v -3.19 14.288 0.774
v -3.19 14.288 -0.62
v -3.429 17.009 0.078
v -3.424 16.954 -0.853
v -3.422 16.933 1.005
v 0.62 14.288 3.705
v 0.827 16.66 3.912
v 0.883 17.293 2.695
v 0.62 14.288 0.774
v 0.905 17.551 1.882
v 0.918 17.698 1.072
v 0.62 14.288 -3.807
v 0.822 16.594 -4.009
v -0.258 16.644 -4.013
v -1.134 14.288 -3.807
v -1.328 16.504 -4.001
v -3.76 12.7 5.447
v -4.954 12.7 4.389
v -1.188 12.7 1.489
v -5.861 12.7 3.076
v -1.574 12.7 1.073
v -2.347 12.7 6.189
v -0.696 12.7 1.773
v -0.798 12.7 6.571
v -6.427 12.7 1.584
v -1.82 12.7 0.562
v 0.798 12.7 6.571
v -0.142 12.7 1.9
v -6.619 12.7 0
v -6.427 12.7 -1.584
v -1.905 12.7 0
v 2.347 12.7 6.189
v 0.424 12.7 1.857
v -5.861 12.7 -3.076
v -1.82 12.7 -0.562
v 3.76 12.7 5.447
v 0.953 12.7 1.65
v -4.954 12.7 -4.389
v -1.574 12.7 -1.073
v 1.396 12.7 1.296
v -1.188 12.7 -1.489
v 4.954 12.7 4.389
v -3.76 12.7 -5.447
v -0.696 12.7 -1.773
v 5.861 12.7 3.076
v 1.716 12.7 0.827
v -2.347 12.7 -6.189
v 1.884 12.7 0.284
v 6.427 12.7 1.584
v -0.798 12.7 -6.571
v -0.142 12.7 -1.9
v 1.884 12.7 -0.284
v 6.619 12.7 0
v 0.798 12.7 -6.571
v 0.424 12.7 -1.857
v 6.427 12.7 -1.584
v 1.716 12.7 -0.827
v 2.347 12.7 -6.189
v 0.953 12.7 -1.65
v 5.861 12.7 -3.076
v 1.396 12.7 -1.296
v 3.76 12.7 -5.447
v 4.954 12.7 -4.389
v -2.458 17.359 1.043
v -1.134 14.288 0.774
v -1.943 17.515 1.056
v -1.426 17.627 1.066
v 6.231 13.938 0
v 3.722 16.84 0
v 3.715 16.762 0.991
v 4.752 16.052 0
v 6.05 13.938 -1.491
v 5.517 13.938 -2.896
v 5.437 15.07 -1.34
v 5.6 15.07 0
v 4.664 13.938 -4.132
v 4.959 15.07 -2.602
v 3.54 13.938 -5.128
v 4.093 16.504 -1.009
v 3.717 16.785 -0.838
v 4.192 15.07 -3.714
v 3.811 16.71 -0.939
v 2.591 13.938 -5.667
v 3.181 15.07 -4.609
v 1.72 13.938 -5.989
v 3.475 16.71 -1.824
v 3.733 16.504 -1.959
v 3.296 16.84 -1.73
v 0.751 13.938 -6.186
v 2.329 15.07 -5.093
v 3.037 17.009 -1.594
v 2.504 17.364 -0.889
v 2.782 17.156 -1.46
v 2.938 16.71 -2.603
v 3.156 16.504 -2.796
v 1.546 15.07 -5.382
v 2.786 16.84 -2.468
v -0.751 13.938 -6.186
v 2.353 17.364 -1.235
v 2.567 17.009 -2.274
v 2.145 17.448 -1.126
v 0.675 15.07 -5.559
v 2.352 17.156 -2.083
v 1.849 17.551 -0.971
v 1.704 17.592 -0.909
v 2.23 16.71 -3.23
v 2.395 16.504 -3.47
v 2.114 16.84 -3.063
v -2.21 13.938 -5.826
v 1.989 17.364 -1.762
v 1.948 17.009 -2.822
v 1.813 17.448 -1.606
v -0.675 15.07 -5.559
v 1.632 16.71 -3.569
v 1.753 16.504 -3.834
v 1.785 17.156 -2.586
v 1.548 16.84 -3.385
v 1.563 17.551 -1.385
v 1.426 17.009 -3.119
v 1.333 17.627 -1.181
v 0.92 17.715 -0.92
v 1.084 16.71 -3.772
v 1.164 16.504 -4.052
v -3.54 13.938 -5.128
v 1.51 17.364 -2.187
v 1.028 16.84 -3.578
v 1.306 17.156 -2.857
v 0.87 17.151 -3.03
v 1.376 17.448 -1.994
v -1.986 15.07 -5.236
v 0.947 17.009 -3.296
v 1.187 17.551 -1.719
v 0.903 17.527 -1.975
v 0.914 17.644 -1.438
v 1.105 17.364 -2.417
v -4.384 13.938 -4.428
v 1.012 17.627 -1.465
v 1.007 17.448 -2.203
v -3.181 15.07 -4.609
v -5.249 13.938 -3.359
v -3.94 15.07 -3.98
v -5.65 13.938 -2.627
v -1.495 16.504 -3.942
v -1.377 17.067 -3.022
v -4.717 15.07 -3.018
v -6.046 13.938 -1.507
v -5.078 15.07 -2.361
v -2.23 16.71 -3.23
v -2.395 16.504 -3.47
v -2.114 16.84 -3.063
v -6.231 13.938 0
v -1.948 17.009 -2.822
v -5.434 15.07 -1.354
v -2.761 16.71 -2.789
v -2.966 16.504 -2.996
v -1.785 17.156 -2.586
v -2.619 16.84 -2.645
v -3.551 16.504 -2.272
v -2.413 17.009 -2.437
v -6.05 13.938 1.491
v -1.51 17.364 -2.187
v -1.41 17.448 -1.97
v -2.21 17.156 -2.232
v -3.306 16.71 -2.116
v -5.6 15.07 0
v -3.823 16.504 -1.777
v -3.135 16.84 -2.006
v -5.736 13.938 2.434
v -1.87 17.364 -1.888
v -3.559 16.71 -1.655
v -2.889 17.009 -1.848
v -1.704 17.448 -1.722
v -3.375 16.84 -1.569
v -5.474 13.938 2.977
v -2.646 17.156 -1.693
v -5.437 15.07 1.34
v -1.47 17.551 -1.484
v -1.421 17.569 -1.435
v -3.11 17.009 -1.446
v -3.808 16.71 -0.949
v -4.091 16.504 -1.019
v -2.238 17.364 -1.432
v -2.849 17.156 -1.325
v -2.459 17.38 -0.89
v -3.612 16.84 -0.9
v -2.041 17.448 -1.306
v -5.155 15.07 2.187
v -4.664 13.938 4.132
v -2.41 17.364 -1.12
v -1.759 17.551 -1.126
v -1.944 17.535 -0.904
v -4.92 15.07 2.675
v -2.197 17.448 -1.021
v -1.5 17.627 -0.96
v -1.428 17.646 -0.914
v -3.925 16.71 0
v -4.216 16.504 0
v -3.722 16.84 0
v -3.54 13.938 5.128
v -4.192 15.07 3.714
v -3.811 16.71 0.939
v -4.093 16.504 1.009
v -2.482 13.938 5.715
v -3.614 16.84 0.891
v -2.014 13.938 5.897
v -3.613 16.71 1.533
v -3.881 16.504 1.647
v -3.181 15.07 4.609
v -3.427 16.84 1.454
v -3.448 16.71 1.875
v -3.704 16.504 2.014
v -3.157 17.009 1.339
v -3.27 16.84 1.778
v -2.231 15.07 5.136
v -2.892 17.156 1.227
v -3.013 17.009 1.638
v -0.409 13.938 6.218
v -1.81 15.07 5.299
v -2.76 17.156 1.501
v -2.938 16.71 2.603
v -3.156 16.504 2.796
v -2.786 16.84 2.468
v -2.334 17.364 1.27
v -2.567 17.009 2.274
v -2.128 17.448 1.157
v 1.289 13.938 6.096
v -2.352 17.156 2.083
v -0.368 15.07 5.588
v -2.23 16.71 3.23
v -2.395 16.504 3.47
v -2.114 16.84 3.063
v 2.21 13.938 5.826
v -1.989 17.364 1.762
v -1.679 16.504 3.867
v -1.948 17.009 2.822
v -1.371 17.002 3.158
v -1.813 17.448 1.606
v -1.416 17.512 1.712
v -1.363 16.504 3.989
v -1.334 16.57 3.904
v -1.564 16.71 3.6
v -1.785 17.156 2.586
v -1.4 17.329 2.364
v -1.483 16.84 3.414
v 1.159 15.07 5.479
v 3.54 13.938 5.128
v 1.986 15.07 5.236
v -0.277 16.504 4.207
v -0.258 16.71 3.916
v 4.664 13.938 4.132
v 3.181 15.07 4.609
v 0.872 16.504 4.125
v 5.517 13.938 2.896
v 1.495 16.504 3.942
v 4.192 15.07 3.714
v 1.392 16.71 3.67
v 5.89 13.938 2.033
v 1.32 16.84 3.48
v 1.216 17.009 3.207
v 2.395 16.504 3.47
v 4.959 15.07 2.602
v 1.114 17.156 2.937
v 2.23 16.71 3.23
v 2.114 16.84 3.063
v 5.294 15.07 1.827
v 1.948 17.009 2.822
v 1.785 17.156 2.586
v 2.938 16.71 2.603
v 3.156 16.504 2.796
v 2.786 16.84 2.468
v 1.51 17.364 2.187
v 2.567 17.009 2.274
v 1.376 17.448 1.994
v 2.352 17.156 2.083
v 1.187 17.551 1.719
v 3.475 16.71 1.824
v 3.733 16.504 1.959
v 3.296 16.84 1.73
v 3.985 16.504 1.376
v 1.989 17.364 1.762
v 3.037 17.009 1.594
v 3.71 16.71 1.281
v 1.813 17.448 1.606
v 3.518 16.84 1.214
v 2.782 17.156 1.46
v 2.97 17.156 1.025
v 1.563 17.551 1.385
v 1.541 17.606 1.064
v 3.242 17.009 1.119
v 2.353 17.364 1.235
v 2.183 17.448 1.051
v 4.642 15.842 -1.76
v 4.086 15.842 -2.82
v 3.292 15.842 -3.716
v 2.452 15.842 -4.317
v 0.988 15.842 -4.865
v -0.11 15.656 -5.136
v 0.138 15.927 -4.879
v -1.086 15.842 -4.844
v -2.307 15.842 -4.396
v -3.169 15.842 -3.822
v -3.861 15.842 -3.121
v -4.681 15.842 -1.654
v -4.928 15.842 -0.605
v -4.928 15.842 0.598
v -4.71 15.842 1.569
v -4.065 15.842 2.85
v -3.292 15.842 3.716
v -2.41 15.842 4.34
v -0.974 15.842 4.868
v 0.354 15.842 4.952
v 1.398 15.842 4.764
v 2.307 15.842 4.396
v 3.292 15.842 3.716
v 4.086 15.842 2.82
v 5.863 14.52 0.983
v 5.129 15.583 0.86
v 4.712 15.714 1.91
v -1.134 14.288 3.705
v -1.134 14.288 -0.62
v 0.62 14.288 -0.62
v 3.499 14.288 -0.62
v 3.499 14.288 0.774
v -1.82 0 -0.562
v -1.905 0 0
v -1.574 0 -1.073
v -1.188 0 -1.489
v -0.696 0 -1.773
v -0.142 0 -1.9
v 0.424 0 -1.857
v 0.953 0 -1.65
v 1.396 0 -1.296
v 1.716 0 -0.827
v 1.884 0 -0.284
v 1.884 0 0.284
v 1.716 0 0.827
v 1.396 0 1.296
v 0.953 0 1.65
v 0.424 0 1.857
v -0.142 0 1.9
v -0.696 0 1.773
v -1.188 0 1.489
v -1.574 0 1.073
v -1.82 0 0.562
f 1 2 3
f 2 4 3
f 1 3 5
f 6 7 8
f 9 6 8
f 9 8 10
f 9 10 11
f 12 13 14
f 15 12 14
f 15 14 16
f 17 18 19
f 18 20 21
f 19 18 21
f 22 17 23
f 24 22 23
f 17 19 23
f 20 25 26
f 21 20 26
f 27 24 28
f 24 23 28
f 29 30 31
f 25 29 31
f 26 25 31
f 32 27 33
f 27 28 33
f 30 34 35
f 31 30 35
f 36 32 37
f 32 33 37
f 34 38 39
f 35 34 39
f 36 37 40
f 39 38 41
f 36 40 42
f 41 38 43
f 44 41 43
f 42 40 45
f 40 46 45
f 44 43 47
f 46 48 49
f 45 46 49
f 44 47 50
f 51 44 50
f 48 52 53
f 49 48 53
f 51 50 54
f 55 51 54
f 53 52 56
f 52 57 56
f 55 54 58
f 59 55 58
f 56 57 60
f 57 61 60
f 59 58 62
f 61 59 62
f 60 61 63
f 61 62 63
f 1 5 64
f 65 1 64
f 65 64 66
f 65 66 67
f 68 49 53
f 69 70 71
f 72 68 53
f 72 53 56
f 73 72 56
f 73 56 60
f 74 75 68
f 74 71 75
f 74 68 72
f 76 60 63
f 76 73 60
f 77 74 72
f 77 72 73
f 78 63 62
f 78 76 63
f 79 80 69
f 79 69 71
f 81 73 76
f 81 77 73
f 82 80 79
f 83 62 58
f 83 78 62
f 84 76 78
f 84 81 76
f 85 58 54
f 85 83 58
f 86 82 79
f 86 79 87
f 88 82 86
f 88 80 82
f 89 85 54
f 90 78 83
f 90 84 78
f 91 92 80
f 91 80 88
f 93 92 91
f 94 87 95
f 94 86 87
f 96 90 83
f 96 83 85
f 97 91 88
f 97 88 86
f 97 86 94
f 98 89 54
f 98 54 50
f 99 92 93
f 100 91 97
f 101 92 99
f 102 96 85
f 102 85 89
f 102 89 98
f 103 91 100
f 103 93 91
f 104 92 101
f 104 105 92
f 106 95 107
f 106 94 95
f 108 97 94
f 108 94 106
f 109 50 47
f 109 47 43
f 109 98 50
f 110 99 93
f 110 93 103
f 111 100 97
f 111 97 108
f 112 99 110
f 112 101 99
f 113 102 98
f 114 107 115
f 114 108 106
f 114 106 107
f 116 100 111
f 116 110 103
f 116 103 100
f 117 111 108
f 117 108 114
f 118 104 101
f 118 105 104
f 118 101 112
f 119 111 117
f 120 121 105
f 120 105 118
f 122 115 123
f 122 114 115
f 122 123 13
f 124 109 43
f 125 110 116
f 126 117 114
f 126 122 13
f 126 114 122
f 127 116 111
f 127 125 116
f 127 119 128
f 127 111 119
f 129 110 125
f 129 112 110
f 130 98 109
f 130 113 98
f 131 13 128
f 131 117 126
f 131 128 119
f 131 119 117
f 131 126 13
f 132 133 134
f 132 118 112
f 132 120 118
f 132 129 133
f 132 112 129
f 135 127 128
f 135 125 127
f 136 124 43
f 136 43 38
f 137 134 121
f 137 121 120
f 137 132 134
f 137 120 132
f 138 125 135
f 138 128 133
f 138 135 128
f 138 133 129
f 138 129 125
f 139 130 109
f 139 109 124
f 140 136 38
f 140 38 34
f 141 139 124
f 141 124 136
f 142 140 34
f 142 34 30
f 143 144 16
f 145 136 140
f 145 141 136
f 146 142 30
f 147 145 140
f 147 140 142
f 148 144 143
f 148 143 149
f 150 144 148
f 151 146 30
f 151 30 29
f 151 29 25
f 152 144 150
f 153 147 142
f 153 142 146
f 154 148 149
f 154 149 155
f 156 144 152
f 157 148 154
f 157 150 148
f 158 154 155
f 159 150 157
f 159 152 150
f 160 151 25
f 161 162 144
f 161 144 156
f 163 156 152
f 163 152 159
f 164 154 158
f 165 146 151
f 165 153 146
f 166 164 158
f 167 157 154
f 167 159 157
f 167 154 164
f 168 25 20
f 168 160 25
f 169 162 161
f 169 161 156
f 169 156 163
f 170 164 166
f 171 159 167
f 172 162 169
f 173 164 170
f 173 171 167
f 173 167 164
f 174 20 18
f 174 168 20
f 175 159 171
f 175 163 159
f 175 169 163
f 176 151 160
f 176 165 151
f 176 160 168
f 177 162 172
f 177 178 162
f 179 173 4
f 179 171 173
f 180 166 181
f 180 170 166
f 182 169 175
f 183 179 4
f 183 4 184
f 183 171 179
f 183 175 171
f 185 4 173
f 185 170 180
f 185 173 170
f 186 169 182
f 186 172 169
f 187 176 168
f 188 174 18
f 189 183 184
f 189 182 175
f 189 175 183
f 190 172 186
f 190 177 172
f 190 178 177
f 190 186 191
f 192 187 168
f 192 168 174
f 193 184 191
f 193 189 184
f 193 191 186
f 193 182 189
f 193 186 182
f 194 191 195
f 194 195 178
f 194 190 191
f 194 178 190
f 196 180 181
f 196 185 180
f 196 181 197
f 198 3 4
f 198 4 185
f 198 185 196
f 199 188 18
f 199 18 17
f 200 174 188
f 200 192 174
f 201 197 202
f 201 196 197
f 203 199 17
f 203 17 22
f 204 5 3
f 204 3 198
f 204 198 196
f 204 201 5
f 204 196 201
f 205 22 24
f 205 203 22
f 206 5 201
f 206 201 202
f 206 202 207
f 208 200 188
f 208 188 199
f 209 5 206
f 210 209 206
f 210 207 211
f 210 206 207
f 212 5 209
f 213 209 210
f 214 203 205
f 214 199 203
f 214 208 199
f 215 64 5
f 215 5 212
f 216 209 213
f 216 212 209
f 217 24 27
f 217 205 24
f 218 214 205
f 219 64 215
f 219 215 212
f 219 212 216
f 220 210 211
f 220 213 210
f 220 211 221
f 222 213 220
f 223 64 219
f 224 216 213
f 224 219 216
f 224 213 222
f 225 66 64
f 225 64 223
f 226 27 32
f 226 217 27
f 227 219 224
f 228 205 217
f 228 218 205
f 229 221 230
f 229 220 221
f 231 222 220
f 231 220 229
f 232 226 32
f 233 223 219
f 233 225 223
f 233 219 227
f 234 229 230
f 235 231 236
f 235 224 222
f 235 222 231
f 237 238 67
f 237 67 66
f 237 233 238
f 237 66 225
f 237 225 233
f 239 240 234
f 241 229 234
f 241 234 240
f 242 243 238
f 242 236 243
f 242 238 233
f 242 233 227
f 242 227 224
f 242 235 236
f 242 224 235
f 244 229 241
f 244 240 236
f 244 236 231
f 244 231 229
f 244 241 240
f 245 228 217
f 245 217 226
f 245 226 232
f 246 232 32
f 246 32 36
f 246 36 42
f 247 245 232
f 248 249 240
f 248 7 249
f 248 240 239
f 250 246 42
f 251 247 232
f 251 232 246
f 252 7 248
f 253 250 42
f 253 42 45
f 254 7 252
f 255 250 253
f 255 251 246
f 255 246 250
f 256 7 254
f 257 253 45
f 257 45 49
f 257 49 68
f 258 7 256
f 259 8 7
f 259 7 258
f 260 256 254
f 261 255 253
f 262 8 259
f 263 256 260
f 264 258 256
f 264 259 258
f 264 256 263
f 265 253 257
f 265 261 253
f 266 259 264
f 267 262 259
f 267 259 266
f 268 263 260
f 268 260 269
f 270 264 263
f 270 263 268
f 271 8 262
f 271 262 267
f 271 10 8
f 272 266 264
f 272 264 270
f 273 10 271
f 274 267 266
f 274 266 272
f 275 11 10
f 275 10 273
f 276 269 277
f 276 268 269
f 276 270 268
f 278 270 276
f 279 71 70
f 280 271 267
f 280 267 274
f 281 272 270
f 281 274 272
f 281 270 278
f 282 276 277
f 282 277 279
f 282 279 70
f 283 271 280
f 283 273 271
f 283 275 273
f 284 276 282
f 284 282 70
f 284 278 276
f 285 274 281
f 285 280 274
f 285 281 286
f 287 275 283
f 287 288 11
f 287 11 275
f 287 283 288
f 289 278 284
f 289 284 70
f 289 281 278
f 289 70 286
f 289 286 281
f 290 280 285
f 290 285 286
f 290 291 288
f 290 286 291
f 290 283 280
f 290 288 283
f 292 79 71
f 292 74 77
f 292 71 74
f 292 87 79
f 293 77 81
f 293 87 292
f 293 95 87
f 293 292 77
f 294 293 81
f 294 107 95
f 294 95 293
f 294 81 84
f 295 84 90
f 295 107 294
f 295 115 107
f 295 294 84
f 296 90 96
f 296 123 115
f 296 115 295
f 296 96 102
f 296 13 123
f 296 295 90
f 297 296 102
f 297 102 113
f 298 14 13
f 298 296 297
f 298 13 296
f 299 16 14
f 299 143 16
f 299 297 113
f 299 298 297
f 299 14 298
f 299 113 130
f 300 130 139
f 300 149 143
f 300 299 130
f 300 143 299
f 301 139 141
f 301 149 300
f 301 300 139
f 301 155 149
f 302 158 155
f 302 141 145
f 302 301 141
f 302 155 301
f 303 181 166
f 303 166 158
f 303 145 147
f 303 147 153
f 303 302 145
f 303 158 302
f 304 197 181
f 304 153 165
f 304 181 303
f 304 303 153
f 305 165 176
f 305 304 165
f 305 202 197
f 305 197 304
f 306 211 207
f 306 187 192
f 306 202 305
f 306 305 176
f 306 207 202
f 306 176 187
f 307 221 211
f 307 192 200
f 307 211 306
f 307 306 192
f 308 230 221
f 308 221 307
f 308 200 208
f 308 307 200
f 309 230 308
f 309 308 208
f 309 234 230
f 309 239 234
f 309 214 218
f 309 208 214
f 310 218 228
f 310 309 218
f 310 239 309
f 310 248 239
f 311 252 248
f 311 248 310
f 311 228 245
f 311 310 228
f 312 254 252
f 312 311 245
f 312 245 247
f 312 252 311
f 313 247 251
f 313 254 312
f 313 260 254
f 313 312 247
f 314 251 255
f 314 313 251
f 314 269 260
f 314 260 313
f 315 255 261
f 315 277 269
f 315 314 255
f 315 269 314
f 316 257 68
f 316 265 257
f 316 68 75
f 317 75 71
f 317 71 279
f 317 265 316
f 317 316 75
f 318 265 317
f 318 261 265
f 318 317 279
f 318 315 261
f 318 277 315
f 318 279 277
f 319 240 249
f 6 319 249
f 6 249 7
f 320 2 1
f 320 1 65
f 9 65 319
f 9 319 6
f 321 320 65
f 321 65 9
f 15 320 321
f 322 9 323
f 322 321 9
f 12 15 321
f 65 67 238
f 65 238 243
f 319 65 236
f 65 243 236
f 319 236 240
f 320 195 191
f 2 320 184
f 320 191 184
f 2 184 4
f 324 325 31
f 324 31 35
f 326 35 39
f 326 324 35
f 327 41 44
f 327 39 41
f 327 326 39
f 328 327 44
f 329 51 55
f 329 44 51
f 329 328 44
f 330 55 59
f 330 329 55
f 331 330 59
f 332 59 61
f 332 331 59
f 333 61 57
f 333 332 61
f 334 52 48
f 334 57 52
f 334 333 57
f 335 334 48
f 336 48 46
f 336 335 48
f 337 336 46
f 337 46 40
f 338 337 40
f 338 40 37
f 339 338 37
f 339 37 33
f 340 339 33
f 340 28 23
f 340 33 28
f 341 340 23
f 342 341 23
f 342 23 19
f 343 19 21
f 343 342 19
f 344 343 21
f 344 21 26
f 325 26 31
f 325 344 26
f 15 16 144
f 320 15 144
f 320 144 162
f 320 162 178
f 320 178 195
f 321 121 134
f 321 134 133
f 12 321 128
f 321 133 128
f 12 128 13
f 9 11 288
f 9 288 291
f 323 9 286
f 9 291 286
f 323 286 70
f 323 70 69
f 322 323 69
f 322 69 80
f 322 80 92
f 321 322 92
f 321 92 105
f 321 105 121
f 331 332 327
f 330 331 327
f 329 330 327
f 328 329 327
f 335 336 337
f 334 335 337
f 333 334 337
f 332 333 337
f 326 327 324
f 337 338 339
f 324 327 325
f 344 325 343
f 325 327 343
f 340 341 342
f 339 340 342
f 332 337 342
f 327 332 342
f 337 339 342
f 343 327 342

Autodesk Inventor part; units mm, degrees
ref_plane "YZ Plane" through (0, 0, 0) normal (1, 0, 0) x (0, 1, 0)
ref_plane "XZ Plane" through (0, 0, 0) normal (0, 1, 0) x (-1, 0, 0)
ref_plane "XY Plane" through (0, 0, 0) normal (0, 0, 1) x (1, 0, 0)
sketch "Sketch1" plane through (0, 0, 0) normal (0, 1, 0) x (-1, 0, 0)
  circle A0 centre (0, 0) radius 1.905
  dimension "d0" = 3.81
extrude "Extrusion1" add sketch "Sketch1" along normal blind 12.7
thread "Thread1" size "8-32 UNC" class "2A" standard "ANSI Unified Screw Threads" full length
sketch "Sketch2" plane through (0, 12.7, 0) normal (0, 1, 0) x (1, 0, 0)
  circle A0 centre (0, 0) radius 6.61892
extrude "Extrusion2" add sketch "Sketch2" along normal blind 5.08
fillet "Fillet1" radius 6.35 1 edges at (-6.6189, 17.78, 0)
sketch "Sketch3" plane through (0, 17.78, 0) normal (0, 1, 0) x (1, 0, 0)
  line L0 (-3.495957, -1.079634) -> (3.804424, -1.079634)
  line L1 (3.804424, -1.079634) -> (3.804424, 0.9254)
  line L2 (3.804424, 0.9254) -> (-3.495957, 0.9254)
  line L3 (-3.495957, 0.9254) -> (-3.495957, -1.079634)
  line L4 (-1.439512, -4.010068) -> (0.9254, -4.010068)
  line L5 (0.9254, -4.010068) -> (0.9254, 4.11289)
  line L6 (0.9254, 4.11289) -> (-1.439512, 4.11289)
  line L7 (-1.439512, 4.11289) -> (-1.439512, -4.010068)
  point P0 (0, 0)
sketch "Sketch3 outline for Extrusion3" plane through (0, 17.78, 0) normal (0, 1, 0) x (1, 0, 0)
  line L0 (-1.439512, 0.9254) -> (-3.495957, 0.9254)
  line L1 (-3.495957, 0.9254) -> (-3.495957, -1.079634)
  line L2 (-3.495957, -1.079634) -> (-1.439512, -1.079634)
  line L3 (-1.439512, -1.079634) -> (-1.439512, -4.010068)
  line L4 (-1.439512, -4.010068) -> (0.9254, -4.010068)
  line L5 (0.9254, -4.010068) -> (0.9254, -1.079634)
  line L6 (0.9254, -1.079634) -> (3.804424, -1.079634)
  line L7 (3.804424, -1.079634) -> (3.804424, 0.9254)
  line L8 (3.804424, 0.9254) -> (0.9254, 0.9254)
  line L9 (0.9254, 0.9254) -> (0.9254, 4.11289)
  line L10 (0.9254, 4.11289) -> (-1.439512, 4.11289)
  line L11 (-1.439512, 4.11289) -> (-1.439512, 0.9254)
extrude "Extrusion3" cut sketch "Sketch3 outline for Extrusion3" against normal blind 3.4925 draft -5
properties part number "tiny screw"
